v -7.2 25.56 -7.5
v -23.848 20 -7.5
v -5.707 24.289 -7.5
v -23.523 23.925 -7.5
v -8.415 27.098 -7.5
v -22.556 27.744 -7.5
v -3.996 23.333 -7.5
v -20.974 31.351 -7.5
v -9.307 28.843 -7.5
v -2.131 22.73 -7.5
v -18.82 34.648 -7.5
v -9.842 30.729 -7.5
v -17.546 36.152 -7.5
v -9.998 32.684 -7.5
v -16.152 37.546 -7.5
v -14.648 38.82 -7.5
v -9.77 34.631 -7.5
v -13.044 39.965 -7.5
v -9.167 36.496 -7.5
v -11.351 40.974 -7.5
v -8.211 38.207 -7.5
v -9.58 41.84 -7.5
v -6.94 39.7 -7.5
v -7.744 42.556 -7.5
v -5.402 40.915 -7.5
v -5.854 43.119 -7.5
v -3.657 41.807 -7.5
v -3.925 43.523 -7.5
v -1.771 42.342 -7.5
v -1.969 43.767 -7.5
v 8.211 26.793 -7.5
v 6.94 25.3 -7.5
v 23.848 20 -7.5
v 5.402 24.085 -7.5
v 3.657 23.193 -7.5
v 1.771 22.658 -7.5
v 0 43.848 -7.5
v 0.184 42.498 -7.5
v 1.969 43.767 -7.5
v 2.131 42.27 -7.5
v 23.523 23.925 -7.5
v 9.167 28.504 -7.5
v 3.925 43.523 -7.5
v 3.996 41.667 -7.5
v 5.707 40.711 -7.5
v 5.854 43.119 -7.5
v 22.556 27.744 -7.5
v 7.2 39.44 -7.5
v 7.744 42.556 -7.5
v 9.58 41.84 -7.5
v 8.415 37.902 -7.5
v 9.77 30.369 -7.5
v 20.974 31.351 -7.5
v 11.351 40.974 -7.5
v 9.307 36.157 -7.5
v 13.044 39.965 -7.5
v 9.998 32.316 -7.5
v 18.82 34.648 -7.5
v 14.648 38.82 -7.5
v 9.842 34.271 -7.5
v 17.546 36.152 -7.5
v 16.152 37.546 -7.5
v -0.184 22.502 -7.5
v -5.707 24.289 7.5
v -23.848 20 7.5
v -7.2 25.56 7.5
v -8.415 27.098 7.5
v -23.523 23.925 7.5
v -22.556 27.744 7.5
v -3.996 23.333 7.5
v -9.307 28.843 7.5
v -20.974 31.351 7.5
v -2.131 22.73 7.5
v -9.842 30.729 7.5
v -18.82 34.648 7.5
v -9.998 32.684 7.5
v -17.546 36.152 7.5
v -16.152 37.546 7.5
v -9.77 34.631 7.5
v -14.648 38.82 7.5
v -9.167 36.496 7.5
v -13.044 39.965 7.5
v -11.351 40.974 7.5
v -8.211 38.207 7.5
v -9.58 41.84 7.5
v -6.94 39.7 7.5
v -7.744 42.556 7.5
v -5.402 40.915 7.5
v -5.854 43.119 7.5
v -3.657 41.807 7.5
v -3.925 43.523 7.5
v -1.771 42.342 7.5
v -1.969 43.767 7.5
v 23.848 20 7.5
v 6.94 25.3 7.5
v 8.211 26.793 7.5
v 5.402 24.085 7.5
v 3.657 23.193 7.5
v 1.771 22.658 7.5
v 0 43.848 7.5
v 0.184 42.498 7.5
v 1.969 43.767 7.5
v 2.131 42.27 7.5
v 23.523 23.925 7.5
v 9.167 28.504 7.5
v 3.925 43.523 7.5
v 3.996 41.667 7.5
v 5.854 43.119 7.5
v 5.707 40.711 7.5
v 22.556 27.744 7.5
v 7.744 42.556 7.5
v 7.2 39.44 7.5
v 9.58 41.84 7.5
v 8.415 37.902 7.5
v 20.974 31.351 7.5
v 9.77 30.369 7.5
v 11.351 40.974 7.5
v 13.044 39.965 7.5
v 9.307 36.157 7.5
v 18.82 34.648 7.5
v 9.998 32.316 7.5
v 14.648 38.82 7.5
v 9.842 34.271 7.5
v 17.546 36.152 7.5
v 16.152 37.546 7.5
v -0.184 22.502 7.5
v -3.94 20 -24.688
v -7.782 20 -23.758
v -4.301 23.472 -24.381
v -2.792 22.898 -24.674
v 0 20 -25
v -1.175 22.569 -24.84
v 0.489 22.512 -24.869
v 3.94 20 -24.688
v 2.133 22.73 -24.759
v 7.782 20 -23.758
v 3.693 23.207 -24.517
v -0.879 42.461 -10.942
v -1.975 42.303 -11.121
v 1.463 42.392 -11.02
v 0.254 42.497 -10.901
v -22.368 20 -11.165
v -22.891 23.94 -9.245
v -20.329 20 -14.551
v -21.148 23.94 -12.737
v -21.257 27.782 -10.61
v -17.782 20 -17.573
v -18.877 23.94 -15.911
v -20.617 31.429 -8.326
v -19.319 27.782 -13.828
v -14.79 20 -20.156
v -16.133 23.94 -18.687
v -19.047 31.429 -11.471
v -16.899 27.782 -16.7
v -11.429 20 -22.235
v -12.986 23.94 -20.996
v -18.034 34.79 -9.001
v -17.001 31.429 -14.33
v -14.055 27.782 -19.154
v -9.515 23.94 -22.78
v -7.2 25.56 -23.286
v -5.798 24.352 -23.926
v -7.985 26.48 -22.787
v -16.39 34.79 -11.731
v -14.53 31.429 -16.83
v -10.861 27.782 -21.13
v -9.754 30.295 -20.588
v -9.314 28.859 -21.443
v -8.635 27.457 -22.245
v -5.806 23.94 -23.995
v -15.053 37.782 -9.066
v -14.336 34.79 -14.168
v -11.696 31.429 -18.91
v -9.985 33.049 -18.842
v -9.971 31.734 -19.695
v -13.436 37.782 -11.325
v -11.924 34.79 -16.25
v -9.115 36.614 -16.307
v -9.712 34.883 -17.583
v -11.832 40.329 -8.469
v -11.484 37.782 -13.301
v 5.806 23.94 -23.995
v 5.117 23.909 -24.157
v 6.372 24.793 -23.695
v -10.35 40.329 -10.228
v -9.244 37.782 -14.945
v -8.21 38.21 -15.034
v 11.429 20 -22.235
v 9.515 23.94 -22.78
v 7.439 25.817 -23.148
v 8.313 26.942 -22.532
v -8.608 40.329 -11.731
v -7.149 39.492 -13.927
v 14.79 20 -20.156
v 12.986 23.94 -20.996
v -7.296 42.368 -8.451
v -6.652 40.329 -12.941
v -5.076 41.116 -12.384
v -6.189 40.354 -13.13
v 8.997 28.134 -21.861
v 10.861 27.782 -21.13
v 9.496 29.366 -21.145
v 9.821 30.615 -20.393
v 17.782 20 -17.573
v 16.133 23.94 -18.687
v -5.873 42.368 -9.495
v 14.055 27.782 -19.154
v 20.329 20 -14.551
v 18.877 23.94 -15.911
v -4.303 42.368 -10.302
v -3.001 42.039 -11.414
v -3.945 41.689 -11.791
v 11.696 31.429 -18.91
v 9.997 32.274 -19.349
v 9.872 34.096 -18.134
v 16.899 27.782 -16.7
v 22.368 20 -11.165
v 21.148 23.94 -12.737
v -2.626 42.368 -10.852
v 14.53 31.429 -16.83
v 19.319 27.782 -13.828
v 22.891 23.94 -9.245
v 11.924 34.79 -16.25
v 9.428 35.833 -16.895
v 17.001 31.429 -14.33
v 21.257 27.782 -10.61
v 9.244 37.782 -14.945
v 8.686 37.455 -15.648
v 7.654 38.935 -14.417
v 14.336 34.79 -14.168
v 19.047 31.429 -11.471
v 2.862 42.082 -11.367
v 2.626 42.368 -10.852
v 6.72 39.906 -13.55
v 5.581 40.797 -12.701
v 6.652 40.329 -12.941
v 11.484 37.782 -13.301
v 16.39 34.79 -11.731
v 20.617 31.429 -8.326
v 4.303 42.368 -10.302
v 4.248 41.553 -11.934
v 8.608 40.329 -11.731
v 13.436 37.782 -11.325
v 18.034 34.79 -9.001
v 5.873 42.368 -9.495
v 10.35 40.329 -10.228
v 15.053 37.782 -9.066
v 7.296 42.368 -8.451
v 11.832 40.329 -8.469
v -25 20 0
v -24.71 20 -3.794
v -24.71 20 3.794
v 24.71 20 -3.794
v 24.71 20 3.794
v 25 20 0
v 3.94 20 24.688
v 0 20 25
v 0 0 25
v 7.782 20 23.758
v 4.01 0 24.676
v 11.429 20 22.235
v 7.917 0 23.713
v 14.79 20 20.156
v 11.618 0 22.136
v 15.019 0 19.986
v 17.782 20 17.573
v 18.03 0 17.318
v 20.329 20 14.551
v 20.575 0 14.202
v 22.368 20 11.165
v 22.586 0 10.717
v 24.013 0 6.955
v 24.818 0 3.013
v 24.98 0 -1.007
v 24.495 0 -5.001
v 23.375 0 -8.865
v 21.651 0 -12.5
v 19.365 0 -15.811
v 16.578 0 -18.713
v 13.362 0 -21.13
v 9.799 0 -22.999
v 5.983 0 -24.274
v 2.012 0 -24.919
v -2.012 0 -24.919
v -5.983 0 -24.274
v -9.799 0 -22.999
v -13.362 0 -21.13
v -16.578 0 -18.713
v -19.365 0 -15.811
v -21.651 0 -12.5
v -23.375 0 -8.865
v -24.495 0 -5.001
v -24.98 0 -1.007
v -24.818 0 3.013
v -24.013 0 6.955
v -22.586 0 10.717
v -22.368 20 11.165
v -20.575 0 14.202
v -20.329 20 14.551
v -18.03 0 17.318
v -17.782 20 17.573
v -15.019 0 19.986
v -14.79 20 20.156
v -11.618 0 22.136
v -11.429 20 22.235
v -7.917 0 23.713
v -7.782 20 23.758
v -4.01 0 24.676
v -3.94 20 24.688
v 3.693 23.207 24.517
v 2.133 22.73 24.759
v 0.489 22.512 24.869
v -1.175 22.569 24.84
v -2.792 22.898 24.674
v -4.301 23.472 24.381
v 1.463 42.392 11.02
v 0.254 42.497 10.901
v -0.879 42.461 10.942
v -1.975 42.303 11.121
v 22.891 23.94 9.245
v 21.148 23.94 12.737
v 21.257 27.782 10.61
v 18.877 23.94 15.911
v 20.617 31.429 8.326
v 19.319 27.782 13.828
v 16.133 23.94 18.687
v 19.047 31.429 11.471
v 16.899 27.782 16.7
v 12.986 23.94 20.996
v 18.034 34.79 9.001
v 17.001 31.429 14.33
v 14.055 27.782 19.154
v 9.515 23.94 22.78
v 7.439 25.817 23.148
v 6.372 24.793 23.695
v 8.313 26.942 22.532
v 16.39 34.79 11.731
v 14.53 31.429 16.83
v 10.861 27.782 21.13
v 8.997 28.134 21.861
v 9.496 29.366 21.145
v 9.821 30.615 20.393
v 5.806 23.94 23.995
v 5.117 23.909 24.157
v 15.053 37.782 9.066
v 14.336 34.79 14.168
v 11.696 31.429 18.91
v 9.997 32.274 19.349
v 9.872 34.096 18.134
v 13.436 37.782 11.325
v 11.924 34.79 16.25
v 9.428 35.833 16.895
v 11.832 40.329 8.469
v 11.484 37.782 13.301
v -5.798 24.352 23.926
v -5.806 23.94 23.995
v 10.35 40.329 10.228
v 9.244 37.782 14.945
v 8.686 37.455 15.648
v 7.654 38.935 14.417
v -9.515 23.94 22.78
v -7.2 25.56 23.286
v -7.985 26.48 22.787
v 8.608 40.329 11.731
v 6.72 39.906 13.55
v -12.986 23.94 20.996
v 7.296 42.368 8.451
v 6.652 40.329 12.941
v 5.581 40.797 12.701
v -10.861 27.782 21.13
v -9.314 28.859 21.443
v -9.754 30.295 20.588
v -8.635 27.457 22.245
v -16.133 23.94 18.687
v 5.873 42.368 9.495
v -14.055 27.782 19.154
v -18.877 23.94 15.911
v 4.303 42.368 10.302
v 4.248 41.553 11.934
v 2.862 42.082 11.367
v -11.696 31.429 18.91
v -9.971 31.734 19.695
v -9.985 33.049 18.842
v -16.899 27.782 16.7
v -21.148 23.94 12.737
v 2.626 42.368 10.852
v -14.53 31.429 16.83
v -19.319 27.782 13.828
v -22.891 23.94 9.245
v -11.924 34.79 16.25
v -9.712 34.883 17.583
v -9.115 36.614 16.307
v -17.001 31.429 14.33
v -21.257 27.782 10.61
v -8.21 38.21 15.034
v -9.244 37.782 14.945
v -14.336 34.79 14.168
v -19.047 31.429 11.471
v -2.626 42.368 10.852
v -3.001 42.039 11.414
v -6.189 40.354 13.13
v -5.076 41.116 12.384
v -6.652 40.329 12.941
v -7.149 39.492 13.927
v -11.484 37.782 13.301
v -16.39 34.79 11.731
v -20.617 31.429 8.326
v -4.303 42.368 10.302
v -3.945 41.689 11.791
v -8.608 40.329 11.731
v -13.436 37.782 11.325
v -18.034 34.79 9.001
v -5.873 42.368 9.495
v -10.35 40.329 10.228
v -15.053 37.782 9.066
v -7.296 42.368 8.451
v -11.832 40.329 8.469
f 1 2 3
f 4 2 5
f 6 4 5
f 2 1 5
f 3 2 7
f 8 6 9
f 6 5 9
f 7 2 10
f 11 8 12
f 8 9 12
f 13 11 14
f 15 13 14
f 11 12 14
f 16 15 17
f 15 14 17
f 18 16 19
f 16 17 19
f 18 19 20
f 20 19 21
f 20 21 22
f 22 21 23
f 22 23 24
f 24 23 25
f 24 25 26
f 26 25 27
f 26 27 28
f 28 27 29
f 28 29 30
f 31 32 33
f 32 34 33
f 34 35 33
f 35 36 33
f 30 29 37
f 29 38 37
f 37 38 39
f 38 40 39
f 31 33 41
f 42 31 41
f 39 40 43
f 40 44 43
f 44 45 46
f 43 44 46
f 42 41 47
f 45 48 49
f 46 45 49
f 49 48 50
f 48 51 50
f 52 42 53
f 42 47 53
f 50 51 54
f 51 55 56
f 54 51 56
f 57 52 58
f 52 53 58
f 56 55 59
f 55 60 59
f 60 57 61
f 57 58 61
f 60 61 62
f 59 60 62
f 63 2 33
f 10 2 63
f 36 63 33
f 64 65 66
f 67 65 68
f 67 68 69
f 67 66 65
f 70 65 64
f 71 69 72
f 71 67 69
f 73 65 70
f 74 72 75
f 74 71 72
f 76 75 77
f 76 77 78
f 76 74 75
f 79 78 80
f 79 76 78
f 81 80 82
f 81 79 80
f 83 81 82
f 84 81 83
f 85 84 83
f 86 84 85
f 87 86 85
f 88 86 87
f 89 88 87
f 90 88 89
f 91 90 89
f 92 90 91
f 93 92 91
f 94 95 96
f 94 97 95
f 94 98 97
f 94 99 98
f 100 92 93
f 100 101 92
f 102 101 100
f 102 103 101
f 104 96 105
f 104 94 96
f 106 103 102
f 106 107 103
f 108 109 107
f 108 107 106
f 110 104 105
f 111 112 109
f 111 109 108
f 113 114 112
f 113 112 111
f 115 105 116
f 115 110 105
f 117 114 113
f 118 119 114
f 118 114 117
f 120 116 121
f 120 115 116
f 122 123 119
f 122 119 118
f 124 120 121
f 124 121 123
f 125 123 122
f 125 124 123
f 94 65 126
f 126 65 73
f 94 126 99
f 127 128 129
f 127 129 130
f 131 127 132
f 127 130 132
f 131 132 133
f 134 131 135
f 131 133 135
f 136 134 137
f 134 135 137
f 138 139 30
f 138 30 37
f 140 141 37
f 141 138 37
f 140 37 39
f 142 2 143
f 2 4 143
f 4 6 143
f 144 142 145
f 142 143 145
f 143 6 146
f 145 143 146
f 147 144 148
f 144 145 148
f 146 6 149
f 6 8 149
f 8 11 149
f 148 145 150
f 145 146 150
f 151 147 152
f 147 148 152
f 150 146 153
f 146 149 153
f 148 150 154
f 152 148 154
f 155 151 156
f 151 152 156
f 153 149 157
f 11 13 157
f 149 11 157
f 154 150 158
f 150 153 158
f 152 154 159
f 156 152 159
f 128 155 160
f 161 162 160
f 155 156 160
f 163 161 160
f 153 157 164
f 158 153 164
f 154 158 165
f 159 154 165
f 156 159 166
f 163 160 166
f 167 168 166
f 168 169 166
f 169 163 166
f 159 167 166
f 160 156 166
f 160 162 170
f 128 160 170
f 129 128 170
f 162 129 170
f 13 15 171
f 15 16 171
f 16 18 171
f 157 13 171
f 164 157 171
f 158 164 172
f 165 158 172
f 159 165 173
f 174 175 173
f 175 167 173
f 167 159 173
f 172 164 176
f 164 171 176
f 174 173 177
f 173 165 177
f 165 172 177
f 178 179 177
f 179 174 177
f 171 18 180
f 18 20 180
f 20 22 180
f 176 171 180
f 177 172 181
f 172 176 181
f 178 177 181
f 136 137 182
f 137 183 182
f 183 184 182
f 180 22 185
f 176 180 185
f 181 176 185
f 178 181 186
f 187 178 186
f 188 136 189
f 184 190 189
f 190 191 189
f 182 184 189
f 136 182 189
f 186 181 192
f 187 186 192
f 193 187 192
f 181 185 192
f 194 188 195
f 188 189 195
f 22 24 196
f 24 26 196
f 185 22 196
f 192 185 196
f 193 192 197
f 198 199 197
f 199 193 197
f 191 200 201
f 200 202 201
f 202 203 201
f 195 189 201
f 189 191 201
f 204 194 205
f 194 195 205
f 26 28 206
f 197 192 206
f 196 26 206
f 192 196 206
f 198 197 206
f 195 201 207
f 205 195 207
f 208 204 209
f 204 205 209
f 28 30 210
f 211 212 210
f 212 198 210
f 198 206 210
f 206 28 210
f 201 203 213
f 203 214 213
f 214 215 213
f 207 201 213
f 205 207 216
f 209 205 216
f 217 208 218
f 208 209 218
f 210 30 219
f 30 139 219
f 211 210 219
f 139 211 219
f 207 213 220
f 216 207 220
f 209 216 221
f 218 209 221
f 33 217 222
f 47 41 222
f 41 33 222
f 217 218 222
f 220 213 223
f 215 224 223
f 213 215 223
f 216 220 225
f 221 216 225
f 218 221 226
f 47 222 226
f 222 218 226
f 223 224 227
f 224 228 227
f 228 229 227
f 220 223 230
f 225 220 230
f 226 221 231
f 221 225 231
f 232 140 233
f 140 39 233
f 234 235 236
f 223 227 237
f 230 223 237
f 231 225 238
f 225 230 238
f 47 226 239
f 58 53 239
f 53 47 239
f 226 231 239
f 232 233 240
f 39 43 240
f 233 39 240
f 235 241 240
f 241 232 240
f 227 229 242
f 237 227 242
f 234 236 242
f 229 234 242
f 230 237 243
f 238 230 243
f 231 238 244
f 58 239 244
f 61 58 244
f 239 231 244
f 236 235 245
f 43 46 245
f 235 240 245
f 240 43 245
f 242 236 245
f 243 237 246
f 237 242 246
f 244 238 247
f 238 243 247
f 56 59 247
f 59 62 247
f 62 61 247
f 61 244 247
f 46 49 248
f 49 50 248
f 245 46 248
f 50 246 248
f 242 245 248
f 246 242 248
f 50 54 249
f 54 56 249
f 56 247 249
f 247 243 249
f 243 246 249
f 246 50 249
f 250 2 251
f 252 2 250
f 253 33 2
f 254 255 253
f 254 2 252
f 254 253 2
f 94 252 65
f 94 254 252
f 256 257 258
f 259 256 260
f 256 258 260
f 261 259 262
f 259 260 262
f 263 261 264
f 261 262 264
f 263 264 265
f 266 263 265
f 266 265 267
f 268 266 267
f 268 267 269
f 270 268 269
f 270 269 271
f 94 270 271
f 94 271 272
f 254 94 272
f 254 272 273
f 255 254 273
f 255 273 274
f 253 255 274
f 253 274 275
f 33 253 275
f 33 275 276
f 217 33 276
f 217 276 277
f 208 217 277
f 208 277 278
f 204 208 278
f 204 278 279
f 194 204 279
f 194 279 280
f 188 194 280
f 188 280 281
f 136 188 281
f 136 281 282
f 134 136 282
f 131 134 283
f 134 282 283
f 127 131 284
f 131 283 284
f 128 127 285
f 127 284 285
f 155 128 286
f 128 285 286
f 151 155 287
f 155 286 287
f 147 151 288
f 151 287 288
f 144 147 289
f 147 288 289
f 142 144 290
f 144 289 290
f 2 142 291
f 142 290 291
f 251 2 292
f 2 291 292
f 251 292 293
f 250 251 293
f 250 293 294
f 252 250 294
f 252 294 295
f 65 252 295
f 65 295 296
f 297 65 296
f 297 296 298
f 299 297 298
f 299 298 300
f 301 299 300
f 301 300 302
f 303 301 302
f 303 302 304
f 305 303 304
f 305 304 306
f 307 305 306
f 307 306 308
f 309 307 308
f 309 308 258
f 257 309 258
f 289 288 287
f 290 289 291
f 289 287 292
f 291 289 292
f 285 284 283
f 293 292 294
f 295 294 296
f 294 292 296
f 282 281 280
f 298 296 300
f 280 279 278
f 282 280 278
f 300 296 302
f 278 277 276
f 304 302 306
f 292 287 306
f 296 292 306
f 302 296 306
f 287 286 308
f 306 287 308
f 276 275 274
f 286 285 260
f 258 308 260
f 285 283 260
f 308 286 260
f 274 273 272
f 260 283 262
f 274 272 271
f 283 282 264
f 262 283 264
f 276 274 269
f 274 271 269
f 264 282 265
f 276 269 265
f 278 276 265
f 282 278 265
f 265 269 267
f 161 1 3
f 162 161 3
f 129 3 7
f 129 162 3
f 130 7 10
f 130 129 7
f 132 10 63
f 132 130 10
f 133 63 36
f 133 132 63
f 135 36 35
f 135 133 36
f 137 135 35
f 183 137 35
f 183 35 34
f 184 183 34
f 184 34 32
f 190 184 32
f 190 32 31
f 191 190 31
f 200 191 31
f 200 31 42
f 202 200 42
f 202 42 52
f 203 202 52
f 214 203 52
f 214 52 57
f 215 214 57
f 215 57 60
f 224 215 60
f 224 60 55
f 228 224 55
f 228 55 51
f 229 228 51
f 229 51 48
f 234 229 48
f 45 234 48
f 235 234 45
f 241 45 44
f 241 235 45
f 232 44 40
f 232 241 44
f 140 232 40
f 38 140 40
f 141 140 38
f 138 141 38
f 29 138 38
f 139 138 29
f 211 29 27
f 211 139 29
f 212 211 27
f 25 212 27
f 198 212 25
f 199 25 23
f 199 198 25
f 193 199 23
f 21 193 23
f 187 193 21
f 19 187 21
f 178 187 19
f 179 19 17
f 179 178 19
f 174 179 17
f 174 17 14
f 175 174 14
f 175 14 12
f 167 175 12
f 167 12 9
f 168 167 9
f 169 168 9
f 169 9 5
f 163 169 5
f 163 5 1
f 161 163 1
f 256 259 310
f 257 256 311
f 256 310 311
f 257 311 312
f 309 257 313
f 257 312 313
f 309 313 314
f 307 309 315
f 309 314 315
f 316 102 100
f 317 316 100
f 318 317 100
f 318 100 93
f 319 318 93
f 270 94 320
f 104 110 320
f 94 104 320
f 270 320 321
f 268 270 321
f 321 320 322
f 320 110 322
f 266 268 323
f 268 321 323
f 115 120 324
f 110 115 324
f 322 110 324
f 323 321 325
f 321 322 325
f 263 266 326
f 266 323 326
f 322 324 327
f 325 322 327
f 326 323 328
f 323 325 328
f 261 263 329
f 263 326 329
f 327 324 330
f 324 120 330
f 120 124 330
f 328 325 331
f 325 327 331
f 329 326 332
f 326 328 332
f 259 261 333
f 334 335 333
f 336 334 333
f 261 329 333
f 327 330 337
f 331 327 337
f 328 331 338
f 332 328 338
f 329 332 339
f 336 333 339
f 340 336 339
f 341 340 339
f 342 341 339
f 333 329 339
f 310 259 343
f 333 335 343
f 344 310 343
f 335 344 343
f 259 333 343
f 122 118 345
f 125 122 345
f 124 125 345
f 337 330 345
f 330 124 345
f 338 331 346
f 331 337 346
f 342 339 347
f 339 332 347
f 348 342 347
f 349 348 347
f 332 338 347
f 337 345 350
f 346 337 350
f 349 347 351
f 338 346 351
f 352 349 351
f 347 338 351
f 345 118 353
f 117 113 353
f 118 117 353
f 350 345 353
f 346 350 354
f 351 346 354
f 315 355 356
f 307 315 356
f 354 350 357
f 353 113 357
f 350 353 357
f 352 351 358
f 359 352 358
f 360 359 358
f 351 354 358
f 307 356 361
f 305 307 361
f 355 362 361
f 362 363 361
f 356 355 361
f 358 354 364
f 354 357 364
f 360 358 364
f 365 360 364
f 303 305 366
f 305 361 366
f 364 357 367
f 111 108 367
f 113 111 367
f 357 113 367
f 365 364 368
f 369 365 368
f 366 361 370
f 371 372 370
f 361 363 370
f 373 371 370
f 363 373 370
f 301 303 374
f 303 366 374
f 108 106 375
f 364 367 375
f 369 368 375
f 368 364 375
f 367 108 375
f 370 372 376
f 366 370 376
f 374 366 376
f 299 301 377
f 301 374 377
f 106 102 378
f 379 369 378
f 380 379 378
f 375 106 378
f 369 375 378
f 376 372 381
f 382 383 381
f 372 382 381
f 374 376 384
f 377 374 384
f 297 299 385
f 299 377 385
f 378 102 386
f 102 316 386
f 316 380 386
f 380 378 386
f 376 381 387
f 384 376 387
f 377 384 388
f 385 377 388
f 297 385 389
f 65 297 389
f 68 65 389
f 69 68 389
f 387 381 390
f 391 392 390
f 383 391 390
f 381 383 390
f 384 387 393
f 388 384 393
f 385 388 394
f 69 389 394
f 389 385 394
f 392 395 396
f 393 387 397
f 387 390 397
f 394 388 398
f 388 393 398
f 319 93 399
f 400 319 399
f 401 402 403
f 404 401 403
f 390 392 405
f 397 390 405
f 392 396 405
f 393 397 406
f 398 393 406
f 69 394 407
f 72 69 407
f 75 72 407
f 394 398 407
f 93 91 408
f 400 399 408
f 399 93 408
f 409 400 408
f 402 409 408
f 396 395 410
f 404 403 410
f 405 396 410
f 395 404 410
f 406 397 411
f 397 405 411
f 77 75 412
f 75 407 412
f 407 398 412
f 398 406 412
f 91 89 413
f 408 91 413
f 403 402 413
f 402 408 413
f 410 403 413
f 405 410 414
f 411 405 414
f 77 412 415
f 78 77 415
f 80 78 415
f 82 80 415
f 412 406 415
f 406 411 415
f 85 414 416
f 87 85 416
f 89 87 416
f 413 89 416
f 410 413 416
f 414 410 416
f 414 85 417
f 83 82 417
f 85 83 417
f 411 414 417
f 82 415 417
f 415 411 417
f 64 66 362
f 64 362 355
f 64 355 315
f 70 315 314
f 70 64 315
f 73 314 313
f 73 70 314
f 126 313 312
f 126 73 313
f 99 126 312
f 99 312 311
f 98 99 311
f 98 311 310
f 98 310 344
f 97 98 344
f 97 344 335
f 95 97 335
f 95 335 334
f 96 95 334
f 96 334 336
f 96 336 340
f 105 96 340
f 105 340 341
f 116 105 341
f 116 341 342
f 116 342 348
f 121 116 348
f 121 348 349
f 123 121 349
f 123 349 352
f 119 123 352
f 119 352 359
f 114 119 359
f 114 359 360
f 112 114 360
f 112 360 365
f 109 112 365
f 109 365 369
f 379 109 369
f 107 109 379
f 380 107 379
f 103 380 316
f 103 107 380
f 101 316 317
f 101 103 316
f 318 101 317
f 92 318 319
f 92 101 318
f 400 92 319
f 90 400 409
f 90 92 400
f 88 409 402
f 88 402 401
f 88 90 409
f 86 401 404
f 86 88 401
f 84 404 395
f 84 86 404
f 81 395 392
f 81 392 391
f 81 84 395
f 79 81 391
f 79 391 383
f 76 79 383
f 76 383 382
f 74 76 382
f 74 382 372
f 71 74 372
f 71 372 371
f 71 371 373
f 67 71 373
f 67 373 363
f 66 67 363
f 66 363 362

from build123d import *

# Parameters (mm, degrees)
SKETCH1_R               = 25
BOSS_EXTRUDE1_DEPTH     = 20
SKETCH5_W               = 7.5
SKETCH5_H               = 25.626943466
CUT_EXTRUDE1_DEPTH      = 25
CUT_EXTRUDE2_DEPTH      = 25
CUT_EXTRUDE2_DEPTH_BACK = 25
SKETCH6_R               = 10


with BuildPart() as part:
    # Sketch1 → Boss-Extrude1 (new body)
    with BuildSketch(Plane(origin=(0, 0, 0), x_dir=(1, 0, 0), z_dir=(0, 1, 0))):
        Circle(SKETCH1_R)
    extrude(amount=BOSS_EXTRUDE1_DEPTH)

    # Sketch4 → Revolve1 (revolve)
    with BuildSketch(Plane.XY):
        with BuildLine():
            Line((0, 45), (0, 20))
            Line((0, 20), (25, 20))
            ThreePointArc((25, 20), (17.67766953, 37.67766953), (0, 45))
        make_face()
    revolve(axis=Axis((0, 45, 0), (0, -1, 0)))

    # Sketch5 → Cut-Extrude1 (cut, symmetric)
    with BuildSketch(Plane(origin=(0, 0, 0), x_dir=(0, 0, -1), z_dir=(1, 0, 0))):
        with Locations((3.75, 32.813471733)):
            Rectangle(SKETCH5_W, SKETCH5_H)
    cut_extrude1 = extrude(amount=CUT_EXTRUDE1_DEPTH, both=True, mode=Mode.SUBTRACT)

    # Mirror1: Cut-Extrude1 across plane
    add(cut_extrude1.mirror(Plane.XY), mode=Mode.SUBTRACT)

    # Sketch6 → Cut-Extrude2 (cut, two sides: drawn at the far end of the back side and taken through both)
    with BuildSketch(Plane.XY.offset(-CUT_EXTRUDE2_DEPTH_BACK)):
        with Locations((0, 32.5)):
            Circle(SKETCH6_R)
    extrude(amount=CUT_EXTRUDE2_DEPTH + CUT_EXTRUDE2_DEPTH_BACK, mode=Mode.SUBTRACT)


solid = part.part
